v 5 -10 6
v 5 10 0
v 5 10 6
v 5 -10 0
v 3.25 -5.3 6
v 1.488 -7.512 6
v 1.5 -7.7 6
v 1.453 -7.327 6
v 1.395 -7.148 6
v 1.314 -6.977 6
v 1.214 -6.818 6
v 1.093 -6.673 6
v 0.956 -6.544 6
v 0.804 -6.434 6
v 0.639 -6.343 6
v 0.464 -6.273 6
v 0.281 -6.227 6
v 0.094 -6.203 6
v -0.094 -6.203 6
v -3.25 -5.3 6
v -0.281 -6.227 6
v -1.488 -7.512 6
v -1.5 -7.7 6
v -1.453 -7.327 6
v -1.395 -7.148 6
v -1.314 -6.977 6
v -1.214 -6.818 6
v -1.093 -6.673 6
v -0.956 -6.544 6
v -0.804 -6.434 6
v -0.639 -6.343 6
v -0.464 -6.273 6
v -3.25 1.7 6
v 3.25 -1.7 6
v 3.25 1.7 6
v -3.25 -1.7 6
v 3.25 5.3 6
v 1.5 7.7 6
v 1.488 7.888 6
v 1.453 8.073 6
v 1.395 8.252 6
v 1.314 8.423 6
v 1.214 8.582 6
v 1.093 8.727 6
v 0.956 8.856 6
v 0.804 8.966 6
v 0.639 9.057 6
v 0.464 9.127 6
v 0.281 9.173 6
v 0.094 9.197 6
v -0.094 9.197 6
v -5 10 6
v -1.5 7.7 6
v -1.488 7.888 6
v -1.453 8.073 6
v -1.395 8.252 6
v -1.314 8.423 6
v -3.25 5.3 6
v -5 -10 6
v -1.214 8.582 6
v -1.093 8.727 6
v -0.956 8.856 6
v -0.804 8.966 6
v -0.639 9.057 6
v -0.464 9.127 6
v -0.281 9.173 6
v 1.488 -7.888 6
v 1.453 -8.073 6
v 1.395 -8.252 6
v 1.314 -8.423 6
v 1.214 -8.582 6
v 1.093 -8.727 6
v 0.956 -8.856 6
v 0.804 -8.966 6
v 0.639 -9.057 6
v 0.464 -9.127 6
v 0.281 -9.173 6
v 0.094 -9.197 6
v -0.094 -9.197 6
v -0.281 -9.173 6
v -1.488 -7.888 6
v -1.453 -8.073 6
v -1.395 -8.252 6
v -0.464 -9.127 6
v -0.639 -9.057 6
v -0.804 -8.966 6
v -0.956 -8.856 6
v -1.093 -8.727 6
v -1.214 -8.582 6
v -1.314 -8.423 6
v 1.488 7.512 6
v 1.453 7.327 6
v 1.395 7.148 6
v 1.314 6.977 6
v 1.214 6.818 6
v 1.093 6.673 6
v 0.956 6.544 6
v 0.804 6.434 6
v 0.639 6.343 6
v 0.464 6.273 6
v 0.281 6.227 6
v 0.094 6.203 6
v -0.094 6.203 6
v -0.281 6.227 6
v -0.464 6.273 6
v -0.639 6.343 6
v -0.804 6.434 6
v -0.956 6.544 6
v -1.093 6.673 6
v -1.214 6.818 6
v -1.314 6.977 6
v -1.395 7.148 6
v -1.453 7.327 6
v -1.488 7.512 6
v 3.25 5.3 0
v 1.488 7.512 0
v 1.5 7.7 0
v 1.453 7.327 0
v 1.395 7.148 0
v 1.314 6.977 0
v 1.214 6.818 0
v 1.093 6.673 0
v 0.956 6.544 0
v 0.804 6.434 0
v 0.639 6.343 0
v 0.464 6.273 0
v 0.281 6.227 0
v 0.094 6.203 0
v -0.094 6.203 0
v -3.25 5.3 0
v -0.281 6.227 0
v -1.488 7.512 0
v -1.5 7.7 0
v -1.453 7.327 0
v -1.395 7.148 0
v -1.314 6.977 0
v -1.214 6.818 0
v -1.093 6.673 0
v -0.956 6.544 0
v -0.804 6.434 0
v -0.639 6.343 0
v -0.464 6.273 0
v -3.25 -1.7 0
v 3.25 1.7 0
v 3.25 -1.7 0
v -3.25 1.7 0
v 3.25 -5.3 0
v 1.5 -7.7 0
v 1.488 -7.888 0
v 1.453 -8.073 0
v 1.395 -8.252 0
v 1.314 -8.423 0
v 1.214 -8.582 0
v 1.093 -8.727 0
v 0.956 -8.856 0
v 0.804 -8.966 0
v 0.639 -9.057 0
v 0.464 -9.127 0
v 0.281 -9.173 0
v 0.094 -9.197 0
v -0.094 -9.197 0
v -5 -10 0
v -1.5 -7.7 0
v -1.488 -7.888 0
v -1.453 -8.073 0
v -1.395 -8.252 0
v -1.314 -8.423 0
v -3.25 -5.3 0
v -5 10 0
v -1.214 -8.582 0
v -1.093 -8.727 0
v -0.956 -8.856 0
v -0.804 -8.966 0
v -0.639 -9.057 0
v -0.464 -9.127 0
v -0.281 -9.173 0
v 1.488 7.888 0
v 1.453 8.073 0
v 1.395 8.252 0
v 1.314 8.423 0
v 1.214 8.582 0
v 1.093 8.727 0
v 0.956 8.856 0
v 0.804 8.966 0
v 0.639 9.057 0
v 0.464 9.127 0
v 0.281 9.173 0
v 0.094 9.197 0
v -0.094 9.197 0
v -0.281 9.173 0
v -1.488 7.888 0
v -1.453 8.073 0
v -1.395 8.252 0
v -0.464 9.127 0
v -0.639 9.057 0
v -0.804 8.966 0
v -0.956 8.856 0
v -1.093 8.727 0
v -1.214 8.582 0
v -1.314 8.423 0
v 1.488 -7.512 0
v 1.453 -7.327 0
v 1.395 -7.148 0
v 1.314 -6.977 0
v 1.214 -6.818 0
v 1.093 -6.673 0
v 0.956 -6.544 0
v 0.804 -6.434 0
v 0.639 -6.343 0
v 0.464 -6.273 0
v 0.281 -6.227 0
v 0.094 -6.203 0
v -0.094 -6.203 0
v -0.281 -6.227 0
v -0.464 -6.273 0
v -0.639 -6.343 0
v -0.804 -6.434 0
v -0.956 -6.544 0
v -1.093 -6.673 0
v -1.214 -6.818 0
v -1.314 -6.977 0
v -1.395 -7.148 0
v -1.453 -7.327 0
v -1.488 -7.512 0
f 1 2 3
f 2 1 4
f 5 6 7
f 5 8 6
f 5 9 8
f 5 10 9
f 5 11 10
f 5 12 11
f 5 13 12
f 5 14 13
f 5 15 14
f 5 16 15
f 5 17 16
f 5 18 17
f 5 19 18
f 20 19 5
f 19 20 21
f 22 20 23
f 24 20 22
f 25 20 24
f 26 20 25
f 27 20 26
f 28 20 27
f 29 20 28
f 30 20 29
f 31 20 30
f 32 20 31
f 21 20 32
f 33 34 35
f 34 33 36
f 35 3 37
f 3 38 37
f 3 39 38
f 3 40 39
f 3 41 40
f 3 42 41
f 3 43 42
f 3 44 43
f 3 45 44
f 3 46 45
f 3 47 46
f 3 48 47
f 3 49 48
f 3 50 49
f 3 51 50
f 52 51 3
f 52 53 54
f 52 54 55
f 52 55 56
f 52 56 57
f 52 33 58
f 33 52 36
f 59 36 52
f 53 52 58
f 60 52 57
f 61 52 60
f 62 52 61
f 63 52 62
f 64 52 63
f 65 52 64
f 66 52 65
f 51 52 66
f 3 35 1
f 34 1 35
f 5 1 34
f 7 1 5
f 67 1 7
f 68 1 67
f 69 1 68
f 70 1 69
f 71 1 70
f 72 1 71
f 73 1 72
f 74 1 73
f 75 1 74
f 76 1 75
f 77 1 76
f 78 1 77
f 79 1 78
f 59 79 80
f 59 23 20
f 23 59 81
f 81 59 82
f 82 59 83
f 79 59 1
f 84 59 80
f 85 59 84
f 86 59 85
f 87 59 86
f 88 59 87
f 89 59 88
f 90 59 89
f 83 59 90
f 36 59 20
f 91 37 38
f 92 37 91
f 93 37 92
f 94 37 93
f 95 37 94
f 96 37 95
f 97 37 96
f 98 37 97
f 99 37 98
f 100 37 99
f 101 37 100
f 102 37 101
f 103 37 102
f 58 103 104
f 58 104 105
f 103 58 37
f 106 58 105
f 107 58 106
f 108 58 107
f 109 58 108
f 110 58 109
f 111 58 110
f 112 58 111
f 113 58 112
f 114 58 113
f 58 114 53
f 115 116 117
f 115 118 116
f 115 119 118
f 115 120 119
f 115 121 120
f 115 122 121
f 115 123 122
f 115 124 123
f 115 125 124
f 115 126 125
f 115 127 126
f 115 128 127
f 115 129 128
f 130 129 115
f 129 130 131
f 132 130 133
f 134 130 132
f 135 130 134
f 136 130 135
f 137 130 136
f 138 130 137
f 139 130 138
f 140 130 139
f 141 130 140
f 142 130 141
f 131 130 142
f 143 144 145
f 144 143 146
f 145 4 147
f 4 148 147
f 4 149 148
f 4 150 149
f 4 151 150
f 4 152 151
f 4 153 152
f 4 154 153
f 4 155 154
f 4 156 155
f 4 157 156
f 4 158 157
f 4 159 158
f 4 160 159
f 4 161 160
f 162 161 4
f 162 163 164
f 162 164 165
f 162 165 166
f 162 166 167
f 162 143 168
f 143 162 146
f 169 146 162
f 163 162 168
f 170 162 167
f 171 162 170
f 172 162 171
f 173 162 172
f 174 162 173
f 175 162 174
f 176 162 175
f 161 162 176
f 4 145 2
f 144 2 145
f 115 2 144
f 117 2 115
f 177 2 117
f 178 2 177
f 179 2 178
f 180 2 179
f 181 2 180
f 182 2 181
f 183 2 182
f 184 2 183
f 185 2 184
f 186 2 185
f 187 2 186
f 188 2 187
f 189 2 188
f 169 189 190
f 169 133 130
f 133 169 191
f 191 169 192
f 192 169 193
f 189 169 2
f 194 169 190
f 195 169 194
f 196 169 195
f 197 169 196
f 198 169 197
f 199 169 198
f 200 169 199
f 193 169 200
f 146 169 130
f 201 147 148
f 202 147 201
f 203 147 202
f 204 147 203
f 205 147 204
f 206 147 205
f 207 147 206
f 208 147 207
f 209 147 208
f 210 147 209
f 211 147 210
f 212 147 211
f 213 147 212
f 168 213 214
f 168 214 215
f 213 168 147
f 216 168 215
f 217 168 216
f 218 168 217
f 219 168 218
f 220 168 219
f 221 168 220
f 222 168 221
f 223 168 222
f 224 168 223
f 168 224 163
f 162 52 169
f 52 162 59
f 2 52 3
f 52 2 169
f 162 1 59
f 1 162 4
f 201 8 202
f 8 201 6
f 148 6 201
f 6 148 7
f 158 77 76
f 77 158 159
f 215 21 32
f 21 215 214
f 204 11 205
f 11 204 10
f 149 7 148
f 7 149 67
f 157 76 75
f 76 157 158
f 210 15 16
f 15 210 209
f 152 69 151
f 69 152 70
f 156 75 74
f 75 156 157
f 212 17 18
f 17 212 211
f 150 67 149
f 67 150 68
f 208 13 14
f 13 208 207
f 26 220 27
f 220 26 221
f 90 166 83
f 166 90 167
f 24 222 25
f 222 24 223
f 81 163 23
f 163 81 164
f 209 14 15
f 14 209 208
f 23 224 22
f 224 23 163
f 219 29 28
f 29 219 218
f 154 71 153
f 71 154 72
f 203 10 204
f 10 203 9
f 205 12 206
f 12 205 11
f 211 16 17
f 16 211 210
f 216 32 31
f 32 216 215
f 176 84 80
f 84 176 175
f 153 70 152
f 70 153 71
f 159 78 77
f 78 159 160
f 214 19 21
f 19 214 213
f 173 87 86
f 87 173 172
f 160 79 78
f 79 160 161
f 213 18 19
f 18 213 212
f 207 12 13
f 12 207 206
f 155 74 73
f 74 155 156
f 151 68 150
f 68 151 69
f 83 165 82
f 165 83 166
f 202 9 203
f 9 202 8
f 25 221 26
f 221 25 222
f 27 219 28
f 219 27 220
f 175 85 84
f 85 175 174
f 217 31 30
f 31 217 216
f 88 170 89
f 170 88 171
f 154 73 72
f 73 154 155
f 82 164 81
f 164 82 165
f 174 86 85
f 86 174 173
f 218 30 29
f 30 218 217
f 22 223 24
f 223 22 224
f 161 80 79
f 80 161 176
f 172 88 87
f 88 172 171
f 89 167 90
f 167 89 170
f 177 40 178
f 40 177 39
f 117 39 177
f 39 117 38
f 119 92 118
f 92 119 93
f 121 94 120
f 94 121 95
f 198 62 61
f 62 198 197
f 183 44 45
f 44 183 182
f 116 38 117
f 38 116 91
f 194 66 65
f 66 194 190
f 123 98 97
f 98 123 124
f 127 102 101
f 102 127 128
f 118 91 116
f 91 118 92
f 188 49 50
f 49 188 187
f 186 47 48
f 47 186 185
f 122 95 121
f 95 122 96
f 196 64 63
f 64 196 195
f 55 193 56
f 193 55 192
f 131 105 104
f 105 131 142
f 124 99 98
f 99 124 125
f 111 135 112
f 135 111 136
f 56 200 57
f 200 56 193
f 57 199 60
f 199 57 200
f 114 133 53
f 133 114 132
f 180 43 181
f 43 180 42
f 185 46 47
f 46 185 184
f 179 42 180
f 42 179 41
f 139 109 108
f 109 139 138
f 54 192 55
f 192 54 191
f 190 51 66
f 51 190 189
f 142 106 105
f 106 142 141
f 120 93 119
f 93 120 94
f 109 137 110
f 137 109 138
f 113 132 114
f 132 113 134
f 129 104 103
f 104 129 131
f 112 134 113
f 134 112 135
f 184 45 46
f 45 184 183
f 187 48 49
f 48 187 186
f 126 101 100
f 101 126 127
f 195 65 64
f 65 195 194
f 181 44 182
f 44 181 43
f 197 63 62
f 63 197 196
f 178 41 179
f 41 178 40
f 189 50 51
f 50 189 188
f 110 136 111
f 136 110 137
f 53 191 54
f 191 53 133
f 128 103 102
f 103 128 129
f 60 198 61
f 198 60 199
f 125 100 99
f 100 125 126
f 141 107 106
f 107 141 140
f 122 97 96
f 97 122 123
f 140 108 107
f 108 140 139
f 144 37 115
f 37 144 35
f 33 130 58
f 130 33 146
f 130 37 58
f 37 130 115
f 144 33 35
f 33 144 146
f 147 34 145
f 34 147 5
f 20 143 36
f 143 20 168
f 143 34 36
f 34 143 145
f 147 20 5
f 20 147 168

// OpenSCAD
difference(){

translate([0,0,3]){

cube([10,20,6],center=true);}

translate([0,-7.7,3]){
cylinder(h=6.3, r=1.5,$fn=50, center=true);}

translate([0,7.7,3]){

cylinder(h=6.3, r=1.5,$fn=50, center=true);}

translate([0,3.5,3]){

cube([6.5,3.6,6],center=true);}

translate([0,-3.5,3]){

cube([6.5,3.6,6],center=true);}
}
